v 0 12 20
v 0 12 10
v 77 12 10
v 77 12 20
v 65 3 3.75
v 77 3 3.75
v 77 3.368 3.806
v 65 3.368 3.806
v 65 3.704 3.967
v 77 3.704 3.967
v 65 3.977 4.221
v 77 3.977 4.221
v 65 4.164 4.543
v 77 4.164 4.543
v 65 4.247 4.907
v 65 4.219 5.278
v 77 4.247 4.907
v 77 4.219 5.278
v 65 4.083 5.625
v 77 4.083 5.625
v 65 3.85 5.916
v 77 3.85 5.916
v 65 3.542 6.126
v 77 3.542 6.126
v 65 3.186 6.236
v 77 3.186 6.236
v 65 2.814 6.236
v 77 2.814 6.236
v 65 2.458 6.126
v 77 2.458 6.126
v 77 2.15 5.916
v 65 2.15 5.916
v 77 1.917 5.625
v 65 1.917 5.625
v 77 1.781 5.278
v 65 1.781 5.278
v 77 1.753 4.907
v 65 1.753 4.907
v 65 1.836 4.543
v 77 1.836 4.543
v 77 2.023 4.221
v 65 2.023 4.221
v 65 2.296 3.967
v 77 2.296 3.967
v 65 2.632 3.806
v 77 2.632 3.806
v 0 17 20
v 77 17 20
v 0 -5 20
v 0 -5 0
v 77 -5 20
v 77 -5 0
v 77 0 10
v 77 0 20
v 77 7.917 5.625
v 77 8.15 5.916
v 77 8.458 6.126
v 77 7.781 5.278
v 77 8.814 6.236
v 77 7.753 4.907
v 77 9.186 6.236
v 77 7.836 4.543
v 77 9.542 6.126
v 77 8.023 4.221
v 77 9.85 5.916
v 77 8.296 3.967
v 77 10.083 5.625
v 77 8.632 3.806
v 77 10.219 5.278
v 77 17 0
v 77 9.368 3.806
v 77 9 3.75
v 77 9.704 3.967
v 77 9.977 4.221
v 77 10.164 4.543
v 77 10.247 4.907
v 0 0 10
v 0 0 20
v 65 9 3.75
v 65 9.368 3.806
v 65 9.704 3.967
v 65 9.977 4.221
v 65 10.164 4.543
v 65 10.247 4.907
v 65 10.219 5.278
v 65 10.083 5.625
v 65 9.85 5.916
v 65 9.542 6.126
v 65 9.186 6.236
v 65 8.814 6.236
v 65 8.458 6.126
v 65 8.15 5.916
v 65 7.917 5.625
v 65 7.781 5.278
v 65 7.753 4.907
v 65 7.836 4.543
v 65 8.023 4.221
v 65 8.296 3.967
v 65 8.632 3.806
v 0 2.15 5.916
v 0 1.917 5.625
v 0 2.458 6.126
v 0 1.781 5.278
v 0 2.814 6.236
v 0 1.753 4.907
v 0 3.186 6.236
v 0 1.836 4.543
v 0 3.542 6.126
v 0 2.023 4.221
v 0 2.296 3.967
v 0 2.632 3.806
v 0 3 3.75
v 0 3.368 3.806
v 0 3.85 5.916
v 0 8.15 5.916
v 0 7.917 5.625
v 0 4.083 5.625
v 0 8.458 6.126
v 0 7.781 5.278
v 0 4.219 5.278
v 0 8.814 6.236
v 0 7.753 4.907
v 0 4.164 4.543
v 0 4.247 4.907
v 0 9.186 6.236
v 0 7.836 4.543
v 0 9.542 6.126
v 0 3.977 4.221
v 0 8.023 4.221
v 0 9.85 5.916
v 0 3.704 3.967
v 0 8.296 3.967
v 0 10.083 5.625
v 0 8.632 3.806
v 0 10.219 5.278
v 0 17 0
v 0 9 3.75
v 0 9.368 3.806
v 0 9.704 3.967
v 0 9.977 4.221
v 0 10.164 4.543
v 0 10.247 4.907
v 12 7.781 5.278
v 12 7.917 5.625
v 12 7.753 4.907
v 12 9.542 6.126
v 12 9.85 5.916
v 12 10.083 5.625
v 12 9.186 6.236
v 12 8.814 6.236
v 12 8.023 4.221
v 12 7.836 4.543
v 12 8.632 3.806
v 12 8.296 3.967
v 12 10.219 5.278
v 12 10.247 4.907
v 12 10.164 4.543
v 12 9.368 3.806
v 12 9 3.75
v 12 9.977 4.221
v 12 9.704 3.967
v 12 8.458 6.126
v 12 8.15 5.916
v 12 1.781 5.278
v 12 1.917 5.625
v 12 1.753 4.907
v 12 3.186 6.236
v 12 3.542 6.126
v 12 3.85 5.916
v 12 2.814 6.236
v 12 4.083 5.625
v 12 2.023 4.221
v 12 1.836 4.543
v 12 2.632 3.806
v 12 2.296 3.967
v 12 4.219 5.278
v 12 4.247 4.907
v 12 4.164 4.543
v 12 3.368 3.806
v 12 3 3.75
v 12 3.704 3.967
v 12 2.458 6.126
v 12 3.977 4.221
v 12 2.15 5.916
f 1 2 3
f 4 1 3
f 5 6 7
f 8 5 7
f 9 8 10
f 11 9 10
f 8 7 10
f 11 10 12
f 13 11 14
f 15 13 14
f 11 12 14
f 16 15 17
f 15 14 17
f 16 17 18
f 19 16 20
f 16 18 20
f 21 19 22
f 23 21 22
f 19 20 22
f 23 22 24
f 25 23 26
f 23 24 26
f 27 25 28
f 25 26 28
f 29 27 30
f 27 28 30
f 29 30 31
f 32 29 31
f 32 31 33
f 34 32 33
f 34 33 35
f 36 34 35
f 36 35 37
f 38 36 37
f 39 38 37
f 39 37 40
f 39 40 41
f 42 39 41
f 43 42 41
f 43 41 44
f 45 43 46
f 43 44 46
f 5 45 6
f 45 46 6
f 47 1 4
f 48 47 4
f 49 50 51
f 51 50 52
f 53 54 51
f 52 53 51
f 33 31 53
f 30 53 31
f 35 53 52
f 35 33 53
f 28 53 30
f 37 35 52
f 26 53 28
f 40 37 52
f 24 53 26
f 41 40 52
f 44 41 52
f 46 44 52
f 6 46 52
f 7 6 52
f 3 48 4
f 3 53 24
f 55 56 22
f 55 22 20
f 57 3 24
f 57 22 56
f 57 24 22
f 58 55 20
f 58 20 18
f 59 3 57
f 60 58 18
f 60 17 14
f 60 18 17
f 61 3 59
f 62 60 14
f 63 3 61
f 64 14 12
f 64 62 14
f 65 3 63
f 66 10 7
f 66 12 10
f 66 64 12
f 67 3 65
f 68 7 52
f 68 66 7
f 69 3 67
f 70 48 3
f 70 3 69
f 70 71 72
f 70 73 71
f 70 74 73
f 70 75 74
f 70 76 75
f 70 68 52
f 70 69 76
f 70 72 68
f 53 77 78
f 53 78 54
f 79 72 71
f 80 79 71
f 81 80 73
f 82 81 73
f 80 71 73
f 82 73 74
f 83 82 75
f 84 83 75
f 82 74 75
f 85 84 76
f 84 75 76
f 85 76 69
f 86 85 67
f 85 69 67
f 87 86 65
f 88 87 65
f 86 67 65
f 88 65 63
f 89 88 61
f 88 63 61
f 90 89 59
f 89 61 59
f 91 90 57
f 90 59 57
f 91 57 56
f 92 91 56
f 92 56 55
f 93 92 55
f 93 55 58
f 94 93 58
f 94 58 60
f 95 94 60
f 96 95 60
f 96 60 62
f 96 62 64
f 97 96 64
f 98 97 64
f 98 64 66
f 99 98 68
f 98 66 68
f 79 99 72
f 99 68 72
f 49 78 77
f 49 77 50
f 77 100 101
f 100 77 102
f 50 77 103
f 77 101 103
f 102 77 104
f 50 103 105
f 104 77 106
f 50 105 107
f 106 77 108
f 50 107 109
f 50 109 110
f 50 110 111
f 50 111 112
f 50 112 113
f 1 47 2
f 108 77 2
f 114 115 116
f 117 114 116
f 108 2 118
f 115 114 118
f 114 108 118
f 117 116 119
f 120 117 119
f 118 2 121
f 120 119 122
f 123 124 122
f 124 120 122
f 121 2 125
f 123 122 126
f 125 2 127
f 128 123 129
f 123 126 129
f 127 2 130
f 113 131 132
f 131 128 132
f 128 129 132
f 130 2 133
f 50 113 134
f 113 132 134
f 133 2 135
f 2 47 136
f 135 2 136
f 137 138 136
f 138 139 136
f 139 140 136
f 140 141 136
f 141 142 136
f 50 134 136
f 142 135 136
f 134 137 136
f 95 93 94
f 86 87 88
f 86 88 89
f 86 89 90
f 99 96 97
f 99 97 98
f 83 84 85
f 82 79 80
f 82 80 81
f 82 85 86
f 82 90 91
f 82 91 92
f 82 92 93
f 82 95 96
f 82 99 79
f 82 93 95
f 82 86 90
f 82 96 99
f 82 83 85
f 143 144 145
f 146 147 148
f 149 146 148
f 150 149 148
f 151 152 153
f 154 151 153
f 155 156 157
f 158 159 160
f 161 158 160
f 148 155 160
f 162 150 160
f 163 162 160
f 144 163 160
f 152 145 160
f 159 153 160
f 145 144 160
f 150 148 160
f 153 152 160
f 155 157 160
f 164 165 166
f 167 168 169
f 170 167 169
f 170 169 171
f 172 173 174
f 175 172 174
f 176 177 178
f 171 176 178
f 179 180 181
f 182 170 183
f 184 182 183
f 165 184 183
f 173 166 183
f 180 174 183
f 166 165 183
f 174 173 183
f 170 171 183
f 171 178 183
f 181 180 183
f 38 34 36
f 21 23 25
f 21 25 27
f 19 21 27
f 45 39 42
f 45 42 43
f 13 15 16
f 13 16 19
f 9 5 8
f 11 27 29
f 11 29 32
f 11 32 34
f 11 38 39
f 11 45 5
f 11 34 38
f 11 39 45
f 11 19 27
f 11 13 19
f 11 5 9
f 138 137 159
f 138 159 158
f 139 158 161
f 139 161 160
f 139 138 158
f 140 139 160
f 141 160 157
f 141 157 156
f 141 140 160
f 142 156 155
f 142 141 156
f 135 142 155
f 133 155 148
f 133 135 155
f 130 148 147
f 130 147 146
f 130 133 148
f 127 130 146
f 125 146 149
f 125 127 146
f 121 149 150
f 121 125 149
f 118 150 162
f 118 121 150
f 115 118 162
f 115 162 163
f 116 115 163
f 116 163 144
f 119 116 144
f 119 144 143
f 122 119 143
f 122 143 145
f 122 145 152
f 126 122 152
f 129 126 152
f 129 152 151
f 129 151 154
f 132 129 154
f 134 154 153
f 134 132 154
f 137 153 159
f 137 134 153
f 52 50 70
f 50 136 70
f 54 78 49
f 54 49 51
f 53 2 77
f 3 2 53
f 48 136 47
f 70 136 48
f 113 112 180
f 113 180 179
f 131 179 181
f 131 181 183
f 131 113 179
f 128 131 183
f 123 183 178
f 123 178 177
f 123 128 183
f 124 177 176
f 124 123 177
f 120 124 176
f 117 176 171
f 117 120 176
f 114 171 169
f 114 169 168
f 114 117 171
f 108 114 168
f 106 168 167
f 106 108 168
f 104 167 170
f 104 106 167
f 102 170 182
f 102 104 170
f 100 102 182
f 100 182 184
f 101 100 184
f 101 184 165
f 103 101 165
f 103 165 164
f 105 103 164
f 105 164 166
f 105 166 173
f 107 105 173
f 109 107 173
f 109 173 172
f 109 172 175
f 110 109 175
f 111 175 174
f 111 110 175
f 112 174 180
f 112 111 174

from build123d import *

# Parameters (mm, degrees)
SKETCH1_W           = 77
SKETCH1_H           = 12
BOSS_EXTRUDE1_DEPTH = 10
SKETCH2_R           = 1.25
CUT_EXTRUDE1_DEPTH  = 12
SKETCH3_W           = 77
SKETCH3_H           = 20
BOSS_EXTRUDE2_DEPTH = 5


with BuildPart() as part:
    # Sketch1 → Boss-Extrude1 (new body)
    with BuildSketch(Plane.XY):
        with Locations((38.5, 6)):
            Rectangle(SKETCH1_W, SKETCH1_H)
    extrude(amount=BOSS_EXTRUDE1_DEPTH)

    # Sketch2 → Cut-Extrude1 (cut)
    with BuildSketch(Plane(origin=(77, 0, 0), x_dir=(0, 0, -1), z_dir=(1, 0, 0))):
        with Locations((-5, 3)):
            Circle(SKETCH2_R)
        with Locations((-5, 9)):
            Circle(SKETCH2_R)
    cut_extrude1 = extrude(amount=-CUT_EXTRUDE1_DEPTH, mode=Mode.SUBTRACT)

    # Mirror1: Cut-Extrude1 across plane
    add(cut_extrude1.mirror(Plane.ZY.offset(-38.5)), mode=Mode.SUBTRACT)

    # Sketch3 → Boss-Extrude2 (add)
    with BuildSketch(Plane(origin=(0, 12, 0), x_dir=(1, 0, 0), z_dir=(0, 1, 0))):
        with Locations((38.5, -10)):
            Rectangle(SKETCH3_W, SKETCH3_H)
    boss_extrude2 = extrude(amount=BOSS_EXTRUDE2_DEPTH)

    # Mirror2: Boss-Extrude2 across plane
    add(boss_extrude2.mirror(Plane(origin=(0, 6, 0), x_dir=(0, 0, 1), z_dir=(0, -1, 0))))


solid = part.part
